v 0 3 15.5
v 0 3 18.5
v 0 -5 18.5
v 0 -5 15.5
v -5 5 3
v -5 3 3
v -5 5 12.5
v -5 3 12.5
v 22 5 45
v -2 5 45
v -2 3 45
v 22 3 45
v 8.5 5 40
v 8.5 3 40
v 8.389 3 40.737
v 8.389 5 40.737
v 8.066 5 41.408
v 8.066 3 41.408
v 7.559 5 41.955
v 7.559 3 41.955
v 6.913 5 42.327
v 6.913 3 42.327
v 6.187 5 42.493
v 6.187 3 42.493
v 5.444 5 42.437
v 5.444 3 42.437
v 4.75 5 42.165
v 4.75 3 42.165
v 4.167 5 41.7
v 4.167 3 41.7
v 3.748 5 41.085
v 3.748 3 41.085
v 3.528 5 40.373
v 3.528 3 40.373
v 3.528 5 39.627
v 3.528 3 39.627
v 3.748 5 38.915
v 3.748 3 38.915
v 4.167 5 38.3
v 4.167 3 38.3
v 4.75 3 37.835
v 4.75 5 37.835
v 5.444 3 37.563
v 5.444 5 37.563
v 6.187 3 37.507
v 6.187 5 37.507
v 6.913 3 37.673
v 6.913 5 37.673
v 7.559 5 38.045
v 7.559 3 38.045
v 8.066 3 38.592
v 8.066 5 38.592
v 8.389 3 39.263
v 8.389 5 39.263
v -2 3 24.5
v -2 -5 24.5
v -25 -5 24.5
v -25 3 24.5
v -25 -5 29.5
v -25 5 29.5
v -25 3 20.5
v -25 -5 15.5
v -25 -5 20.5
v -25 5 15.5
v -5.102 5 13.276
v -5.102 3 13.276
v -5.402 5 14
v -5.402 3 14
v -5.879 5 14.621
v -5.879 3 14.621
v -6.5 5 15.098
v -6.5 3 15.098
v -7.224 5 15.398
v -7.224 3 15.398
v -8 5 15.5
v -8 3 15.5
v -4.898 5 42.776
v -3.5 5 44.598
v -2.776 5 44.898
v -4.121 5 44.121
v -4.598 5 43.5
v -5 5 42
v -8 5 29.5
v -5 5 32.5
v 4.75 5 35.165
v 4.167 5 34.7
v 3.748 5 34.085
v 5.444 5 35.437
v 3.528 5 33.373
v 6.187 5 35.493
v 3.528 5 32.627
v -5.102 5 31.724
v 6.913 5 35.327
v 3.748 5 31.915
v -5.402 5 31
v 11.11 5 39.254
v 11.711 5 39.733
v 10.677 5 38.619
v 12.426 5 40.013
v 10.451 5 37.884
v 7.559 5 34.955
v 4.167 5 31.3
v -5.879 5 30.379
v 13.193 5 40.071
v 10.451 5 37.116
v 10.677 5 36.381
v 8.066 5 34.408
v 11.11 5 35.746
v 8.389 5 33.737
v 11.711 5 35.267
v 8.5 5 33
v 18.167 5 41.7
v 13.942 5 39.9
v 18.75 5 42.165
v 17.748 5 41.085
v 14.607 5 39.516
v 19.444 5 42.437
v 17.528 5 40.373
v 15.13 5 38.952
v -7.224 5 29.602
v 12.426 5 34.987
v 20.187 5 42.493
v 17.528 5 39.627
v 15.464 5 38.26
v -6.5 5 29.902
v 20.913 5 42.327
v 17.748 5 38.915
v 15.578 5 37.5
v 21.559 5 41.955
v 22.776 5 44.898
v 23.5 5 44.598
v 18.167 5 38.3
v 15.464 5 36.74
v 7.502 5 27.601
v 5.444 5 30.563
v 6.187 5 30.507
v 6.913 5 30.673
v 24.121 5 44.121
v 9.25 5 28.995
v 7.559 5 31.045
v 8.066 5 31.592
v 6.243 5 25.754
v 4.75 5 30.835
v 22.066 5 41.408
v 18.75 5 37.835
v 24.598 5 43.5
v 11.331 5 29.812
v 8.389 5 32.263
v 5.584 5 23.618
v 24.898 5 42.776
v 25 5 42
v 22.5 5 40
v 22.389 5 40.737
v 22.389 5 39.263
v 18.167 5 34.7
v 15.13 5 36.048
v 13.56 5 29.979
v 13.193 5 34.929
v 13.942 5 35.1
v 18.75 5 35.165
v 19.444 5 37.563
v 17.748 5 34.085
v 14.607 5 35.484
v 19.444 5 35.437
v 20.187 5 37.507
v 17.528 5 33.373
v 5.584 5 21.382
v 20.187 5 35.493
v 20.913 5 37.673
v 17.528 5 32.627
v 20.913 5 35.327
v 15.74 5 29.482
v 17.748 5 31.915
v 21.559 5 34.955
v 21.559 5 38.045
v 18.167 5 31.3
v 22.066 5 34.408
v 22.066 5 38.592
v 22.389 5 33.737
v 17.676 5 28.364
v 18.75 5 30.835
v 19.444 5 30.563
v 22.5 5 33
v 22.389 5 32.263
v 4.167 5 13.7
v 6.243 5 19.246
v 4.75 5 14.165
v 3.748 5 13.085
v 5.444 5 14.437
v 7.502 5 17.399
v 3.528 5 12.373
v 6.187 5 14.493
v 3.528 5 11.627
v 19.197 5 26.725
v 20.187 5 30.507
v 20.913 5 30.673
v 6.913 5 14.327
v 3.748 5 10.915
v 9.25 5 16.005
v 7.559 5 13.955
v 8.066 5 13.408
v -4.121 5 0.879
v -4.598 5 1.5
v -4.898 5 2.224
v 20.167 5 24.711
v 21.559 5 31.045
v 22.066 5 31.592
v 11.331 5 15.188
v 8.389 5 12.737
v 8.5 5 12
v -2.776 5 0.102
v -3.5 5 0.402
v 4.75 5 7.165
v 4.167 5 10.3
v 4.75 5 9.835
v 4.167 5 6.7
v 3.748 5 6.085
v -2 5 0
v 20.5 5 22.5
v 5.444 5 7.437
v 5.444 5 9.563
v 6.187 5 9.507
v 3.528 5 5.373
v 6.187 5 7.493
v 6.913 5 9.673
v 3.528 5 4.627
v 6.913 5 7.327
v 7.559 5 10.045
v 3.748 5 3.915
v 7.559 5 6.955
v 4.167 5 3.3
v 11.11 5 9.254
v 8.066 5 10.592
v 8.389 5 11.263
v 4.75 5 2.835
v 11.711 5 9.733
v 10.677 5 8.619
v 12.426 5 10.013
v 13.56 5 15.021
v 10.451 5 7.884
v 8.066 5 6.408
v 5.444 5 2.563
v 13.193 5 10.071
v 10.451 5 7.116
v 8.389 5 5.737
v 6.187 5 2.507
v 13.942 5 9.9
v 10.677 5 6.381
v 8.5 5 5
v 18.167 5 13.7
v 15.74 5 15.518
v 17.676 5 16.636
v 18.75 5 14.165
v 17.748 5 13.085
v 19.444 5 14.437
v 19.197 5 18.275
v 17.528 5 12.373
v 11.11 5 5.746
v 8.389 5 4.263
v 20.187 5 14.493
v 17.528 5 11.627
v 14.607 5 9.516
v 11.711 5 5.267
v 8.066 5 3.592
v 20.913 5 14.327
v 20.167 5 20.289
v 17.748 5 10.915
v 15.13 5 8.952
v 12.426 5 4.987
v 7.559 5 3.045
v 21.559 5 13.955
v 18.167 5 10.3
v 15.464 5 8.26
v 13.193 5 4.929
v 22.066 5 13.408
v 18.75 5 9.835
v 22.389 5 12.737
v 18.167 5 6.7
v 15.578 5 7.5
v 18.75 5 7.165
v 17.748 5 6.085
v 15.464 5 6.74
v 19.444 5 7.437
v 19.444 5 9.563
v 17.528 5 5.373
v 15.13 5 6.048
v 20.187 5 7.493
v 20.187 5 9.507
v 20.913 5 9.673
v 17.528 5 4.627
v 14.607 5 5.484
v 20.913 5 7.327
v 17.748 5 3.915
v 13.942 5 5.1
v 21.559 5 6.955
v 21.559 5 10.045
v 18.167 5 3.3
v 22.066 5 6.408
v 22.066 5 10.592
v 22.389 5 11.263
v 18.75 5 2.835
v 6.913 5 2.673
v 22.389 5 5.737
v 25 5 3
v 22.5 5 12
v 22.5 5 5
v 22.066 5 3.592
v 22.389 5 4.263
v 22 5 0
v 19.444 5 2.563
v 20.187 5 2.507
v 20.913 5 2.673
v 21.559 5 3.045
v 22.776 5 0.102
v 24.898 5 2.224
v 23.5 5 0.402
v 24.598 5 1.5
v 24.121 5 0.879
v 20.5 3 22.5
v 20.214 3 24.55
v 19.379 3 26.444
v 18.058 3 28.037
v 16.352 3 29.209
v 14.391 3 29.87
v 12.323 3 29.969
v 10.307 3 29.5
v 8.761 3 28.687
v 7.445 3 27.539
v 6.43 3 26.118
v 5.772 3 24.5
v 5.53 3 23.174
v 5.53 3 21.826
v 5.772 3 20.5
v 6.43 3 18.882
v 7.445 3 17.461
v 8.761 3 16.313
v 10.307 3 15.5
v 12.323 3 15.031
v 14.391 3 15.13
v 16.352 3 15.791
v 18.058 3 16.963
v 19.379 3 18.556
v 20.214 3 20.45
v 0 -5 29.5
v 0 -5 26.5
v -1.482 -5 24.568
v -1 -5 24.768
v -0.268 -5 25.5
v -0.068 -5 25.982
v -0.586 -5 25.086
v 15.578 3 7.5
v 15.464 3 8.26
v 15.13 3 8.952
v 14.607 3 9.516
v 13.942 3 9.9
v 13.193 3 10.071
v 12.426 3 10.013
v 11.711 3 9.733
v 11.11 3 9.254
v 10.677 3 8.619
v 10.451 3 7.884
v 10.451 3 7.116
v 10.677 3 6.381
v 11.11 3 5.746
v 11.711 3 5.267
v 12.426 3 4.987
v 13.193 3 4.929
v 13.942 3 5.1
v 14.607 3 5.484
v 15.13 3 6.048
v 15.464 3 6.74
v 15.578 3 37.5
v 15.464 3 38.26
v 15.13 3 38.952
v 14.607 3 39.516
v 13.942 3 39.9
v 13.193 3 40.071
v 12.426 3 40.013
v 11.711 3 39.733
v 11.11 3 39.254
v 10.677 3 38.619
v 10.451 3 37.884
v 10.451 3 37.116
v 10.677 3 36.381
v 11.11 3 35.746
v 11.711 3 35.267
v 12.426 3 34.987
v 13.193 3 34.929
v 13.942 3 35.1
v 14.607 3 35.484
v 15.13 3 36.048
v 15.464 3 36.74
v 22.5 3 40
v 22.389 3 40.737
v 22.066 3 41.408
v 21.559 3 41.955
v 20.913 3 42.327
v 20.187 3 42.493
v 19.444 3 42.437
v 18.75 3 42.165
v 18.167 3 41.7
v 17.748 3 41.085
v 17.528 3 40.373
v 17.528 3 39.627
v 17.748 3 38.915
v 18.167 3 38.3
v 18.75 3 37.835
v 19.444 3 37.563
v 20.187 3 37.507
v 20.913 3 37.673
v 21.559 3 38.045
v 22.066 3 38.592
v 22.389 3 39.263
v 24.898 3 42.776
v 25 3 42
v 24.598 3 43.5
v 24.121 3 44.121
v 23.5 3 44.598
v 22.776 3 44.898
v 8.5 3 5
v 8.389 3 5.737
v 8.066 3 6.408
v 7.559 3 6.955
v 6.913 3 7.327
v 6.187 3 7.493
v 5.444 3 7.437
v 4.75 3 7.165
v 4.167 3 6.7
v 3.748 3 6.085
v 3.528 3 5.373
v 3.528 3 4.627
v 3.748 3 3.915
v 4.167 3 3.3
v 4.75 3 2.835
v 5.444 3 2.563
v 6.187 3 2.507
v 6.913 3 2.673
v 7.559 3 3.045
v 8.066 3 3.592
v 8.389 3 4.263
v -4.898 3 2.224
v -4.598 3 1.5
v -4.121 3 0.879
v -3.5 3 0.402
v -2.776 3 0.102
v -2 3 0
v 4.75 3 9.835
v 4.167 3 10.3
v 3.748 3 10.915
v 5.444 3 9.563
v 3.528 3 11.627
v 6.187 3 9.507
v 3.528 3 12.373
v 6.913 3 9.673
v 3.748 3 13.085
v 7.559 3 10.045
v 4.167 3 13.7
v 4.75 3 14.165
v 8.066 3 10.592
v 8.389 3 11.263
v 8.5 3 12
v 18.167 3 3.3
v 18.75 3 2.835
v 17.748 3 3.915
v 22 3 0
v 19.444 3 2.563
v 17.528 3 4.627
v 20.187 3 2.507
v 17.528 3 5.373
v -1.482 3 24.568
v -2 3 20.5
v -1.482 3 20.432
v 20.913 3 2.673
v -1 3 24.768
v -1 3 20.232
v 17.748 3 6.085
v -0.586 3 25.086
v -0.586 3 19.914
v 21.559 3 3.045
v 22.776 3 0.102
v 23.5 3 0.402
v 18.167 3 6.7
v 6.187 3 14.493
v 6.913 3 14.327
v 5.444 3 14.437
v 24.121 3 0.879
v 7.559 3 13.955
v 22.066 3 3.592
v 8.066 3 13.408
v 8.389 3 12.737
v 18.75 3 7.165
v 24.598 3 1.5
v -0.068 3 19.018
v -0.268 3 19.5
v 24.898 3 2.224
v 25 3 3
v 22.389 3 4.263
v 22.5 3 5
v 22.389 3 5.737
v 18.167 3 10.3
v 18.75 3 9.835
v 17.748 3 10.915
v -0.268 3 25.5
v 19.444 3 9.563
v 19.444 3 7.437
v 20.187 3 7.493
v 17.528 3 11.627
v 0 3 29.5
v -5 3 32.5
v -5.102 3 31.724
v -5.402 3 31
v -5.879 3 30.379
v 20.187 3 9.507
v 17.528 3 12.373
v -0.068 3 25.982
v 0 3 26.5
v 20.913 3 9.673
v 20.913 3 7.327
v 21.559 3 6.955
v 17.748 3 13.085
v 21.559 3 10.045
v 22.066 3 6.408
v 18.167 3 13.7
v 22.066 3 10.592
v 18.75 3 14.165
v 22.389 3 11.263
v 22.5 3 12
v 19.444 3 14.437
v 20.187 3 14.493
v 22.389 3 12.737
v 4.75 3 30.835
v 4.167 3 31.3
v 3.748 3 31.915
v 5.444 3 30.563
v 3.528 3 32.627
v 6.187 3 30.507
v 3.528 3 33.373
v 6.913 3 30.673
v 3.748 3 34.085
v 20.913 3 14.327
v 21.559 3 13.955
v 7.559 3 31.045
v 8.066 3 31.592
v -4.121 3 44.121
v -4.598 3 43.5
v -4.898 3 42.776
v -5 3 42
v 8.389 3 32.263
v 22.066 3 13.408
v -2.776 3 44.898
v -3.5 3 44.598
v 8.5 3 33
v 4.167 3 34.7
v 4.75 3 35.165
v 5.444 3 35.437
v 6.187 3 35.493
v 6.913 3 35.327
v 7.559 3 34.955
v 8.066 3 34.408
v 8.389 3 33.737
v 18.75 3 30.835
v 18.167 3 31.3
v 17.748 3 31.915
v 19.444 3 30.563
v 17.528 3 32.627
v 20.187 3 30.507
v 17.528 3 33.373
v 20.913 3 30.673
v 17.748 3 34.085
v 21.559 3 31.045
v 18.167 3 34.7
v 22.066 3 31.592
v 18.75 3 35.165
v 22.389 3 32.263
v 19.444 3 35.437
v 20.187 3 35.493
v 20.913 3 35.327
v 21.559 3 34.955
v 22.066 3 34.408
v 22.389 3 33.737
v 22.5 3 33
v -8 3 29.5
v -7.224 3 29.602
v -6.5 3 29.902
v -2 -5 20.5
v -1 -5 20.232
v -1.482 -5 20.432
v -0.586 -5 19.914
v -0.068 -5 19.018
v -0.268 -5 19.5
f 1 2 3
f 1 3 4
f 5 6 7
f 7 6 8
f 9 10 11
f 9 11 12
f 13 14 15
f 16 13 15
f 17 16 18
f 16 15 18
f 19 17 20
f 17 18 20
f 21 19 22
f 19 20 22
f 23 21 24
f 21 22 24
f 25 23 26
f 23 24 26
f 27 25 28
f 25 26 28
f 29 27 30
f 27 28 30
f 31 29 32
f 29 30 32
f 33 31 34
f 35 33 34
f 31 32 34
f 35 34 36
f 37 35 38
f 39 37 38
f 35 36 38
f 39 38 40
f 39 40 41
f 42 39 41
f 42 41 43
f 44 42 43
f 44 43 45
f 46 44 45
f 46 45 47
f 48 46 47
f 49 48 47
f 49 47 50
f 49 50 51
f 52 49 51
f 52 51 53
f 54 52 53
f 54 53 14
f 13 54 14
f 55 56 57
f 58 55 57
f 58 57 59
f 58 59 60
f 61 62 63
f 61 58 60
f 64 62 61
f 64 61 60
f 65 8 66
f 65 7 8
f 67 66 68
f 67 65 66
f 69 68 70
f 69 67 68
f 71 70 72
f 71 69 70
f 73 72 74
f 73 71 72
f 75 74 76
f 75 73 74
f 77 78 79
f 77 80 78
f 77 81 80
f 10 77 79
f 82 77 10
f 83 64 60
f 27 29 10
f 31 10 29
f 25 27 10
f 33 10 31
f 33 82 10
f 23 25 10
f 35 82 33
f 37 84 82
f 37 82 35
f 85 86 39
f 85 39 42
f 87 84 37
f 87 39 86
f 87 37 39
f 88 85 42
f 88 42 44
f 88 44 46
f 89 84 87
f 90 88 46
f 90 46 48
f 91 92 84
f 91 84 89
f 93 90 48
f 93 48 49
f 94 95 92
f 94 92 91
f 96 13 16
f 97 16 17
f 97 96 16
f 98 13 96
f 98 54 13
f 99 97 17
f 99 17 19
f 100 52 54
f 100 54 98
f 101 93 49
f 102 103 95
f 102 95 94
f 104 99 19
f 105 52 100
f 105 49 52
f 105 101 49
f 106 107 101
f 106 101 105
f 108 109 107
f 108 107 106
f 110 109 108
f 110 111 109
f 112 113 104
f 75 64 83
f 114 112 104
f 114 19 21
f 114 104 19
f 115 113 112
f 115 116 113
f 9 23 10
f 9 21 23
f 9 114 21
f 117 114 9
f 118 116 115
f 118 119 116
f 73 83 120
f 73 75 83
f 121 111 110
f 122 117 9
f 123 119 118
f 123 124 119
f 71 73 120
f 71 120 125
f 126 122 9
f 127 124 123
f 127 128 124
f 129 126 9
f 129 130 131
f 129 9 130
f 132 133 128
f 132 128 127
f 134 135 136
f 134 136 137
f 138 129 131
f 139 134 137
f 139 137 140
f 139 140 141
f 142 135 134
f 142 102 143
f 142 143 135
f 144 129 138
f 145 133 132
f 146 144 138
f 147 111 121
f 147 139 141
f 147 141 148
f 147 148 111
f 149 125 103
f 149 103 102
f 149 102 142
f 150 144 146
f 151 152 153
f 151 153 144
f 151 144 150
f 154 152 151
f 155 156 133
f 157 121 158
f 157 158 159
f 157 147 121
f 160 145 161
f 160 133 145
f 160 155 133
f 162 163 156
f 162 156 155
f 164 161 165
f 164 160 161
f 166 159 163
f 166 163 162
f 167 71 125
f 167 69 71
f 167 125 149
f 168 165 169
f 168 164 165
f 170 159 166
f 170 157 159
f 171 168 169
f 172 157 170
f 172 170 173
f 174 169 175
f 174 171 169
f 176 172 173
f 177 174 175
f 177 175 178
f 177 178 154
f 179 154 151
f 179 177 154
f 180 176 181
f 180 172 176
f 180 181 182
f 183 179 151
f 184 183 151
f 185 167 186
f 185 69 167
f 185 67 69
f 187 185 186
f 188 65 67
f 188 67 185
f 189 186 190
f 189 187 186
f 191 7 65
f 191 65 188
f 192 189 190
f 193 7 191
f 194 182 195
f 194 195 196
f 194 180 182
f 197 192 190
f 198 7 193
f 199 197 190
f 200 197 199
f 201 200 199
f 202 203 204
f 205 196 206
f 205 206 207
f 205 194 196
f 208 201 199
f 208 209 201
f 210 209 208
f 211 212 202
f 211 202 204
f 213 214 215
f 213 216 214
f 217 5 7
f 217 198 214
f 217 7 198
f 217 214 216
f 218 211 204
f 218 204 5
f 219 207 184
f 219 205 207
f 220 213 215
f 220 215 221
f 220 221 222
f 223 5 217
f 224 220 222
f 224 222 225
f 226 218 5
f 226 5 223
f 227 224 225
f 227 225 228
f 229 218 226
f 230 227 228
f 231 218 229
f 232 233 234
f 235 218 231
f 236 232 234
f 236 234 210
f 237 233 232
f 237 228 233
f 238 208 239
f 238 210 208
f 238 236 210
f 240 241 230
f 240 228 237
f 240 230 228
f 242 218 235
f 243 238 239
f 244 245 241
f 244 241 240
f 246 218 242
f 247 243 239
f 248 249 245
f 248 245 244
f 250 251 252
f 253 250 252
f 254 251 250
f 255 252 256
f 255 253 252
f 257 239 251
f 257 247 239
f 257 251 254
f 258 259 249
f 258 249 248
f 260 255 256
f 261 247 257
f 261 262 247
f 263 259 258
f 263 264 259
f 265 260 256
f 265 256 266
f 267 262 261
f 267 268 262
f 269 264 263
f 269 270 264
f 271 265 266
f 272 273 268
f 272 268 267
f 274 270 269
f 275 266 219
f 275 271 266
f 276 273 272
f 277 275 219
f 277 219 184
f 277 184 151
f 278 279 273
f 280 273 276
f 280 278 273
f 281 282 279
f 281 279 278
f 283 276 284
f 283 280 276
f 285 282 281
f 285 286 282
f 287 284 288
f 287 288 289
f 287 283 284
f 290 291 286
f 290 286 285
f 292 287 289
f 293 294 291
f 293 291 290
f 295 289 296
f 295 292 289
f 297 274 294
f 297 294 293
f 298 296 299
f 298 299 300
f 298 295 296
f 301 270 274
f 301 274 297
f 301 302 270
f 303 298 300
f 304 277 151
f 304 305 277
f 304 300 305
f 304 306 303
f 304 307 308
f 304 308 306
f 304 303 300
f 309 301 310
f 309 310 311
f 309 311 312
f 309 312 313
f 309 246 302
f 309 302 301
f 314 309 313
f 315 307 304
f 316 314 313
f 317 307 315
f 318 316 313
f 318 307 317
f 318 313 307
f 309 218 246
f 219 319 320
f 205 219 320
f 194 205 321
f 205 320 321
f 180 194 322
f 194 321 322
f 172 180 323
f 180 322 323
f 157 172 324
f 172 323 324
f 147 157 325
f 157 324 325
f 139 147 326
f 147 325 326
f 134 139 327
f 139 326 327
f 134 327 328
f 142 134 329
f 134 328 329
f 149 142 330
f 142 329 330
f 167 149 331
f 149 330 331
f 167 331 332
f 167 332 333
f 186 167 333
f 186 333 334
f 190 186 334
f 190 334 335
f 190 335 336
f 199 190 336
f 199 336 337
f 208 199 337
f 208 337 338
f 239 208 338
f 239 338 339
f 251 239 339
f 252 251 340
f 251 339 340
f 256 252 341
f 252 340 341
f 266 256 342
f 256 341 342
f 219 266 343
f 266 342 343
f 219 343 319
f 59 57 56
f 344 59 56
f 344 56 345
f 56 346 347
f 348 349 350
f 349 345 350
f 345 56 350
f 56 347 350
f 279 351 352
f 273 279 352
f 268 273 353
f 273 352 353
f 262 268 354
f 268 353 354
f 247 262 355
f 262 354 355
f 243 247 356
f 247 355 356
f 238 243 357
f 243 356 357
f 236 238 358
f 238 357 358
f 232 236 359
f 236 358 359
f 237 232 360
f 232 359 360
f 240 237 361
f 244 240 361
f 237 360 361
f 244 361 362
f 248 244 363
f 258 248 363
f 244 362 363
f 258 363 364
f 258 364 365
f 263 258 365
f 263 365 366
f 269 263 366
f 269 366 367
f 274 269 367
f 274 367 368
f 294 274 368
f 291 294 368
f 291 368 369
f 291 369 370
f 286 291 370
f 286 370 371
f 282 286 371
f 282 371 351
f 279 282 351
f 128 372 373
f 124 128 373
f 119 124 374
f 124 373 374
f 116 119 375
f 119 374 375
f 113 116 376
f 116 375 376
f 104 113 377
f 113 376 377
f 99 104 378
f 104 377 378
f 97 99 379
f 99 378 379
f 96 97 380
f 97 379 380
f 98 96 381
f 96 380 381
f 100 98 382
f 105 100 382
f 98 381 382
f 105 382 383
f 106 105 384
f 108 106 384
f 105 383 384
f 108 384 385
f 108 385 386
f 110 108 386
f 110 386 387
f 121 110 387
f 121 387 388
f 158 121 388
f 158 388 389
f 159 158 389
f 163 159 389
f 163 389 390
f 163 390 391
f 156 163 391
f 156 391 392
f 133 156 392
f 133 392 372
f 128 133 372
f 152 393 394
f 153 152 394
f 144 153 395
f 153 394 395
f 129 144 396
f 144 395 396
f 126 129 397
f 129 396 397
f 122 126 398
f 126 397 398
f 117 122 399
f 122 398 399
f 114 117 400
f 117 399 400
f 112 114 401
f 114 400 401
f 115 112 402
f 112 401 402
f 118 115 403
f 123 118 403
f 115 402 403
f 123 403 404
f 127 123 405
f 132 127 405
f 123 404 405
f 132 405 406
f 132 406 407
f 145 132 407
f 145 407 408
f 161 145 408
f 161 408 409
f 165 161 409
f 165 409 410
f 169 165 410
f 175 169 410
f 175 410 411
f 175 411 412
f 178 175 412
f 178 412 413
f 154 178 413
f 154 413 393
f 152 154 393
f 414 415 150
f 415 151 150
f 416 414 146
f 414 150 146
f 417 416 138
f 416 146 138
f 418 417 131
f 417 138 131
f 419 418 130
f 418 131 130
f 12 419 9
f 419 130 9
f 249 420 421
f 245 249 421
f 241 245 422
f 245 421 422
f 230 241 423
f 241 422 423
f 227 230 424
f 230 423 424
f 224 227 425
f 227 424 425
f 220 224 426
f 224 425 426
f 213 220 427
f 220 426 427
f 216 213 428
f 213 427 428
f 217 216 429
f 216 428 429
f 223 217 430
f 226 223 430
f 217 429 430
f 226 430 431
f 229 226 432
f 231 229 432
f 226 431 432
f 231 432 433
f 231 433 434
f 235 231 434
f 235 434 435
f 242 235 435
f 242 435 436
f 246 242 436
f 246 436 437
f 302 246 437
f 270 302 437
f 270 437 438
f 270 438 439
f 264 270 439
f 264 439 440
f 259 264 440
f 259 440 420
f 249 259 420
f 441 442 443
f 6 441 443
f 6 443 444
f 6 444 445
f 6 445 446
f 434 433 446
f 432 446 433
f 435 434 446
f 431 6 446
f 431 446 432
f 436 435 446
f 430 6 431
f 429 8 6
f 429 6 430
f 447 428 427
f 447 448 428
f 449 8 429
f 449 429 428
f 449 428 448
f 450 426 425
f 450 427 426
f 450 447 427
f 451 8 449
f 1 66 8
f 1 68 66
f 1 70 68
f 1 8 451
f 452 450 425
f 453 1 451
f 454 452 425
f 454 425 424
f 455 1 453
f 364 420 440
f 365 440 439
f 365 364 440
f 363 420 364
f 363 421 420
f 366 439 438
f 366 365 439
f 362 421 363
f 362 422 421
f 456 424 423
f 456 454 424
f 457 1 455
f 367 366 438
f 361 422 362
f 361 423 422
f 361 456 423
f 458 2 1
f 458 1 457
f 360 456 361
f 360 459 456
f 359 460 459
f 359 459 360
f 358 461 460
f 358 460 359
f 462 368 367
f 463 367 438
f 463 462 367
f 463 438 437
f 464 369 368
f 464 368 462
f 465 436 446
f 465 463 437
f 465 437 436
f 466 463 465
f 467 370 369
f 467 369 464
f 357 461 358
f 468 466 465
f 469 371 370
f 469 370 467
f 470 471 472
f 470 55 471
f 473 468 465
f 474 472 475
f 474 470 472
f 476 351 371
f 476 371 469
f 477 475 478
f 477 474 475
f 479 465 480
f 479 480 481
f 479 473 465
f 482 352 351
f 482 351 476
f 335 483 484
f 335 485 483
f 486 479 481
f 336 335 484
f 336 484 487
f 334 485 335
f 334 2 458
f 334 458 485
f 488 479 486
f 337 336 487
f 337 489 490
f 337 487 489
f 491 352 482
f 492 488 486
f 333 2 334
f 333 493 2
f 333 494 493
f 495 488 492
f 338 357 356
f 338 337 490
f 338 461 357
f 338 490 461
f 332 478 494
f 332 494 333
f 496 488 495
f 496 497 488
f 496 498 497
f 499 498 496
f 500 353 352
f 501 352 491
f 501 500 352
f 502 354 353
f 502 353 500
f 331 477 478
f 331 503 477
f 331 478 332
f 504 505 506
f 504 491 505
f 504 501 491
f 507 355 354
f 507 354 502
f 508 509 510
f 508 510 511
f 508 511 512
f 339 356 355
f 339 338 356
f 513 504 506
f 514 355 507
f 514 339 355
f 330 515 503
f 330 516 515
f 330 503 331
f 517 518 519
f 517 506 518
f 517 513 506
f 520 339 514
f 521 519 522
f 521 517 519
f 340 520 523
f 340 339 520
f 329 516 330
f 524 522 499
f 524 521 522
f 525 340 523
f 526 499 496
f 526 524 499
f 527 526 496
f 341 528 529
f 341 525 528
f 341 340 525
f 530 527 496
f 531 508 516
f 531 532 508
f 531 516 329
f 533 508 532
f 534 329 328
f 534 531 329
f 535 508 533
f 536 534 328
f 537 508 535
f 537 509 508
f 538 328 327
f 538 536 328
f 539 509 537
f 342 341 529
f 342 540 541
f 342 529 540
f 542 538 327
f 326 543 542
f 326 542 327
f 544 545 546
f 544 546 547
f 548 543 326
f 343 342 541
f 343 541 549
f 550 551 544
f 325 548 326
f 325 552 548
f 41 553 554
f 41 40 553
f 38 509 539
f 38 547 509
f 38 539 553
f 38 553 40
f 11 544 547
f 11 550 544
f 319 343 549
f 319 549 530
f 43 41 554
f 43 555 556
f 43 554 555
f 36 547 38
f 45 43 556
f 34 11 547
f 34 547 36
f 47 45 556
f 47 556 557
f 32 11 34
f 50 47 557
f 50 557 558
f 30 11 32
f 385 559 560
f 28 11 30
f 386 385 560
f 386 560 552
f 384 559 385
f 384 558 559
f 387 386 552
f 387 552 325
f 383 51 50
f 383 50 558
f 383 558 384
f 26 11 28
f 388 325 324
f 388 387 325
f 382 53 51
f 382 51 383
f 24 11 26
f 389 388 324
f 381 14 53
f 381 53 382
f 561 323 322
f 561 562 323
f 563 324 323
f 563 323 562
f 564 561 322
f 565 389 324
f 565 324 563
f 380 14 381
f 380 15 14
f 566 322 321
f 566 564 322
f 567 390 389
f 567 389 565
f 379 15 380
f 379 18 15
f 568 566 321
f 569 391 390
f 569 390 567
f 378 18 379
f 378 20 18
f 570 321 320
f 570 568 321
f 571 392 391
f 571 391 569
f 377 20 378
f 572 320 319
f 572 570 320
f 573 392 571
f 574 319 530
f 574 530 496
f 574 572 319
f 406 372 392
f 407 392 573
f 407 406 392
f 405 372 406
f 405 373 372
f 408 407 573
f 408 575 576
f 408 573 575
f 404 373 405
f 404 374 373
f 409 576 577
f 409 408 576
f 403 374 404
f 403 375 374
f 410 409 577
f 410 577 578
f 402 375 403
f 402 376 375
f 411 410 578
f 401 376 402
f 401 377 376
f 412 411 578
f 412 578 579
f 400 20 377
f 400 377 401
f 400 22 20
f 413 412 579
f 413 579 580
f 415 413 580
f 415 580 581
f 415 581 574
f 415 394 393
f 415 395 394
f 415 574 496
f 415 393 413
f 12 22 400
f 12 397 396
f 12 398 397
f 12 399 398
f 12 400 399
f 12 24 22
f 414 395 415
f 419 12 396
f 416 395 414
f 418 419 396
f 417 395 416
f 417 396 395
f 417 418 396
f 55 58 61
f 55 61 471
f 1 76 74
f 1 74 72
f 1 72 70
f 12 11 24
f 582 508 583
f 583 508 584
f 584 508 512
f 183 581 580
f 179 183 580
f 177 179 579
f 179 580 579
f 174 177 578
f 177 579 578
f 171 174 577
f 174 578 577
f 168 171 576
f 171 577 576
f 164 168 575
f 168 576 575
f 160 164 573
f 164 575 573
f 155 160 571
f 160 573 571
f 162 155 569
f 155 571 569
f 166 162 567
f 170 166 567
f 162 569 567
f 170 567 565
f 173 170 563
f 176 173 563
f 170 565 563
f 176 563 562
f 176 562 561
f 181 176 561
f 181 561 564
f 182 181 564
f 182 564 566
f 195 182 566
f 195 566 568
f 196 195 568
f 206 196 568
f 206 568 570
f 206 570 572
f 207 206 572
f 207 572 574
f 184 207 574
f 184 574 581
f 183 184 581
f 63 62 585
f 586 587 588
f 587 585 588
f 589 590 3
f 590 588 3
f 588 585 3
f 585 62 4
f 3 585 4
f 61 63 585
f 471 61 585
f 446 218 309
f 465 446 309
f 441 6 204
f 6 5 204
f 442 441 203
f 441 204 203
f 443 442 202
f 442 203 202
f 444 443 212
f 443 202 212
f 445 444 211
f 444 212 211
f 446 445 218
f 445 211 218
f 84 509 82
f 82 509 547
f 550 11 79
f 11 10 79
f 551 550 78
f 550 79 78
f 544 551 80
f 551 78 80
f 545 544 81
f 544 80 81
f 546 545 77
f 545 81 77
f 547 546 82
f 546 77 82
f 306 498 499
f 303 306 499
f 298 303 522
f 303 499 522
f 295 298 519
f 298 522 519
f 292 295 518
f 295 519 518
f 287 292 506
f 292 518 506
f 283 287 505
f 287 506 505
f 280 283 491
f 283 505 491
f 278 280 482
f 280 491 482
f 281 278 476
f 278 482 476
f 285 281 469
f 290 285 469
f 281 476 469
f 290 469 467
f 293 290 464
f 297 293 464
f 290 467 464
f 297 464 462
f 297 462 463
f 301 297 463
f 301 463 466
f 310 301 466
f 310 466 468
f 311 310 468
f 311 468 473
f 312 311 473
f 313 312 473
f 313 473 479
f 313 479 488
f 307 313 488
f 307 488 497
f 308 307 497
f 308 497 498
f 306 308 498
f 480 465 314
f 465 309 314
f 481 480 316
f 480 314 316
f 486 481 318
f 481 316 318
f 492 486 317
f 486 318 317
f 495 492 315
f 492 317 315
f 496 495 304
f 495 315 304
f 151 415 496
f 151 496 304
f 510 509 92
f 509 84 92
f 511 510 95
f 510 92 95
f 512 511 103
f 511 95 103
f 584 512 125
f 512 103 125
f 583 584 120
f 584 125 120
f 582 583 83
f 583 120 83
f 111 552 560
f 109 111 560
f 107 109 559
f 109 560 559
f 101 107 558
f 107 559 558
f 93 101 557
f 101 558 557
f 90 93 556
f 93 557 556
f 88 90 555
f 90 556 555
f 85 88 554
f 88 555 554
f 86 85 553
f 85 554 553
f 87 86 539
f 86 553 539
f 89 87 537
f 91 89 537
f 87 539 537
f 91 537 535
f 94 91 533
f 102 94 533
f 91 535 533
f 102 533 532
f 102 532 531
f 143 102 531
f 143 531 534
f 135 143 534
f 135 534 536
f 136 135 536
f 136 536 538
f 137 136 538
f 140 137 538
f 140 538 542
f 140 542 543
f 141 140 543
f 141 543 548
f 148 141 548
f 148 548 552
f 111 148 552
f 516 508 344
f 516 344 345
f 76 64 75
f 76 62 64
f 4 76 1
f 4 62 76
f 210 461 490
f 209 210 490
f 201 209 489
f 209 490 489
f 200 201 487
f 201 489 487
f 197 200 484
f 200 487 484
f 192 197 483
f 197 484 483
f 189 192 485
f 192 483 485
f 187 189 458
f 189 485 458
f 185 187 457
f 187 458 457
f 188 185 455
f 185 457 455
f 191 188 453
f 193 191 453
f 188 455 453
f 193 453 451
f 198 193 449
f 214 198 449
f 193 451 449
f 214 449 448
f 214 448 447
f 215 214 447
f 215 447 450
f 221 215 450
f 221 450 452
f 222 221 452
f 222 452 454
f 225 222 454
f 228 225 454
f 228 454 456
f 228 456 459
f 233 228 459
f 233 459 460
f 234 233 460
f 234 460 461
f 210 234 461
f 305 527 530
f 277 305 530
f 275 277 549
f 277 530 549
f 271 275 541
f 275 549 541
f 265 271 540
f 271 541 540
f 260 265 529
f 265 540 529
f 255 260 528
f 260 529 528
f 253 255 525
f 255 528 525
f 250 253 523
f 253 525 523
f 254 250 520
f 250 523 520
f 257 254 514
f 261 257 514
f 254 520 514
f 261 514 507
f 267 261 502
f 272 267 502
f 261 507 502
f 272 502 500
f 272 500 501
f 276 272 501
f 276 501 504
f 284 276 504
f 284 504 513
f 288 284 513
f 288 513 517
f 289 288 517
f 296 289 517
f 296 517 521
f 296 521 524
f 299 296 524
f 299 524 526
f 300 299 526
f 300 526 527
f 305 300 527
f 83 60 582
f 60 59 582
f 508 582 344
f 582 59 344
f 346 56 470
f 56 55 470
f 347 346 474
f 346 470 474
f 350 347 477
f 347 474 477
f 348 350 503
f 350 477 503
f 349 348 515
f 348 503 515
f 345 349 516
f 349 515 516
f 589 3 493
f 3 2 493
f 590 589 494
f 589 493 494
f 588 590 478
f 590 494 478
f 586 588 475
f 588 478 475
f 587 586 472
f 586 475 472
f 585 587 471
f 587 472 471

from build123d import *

# Parameters (mm, degrees)
F0_W      = 50
F0_H      = 10
F1_DEPTH  = 45
F2_R      = 2.5781
F3_DEPTH  = 25
F4_R      = 7.5
F5_DEPTH  = 10.001
F6_R      = 2.5
F7_DEPTH  = 25
F8_W      = 20
F8_H      = 15.5
F9_DEPTH  = 25
F8_R      = 2.5
F8_R_2    = 2.5781
F8_W_2    = 25
F8_H_2    = 4
F10_DEPTH = 8
F11_R     = 3
F12_R     = 2


# Not quite as in the source:
# - a feature of the source that left no trace in its solid (it failed there, or was rolled back) is left out


with BuildPart() as f1:
    # F0 (on Top) → F1 (new body)
    with BuildSketch(Plane.XY):
        Rectangle(F0_W, F0_H)
    extrude(amount=F1_DEPTH)

    # F2 (on face) → F3 (cut)
    with BuildSketch(Plane.XZ.offset(5)):
        with Locations((13, 37.5)):
            Circle(F2_R)
        with Locations((13, 7.5)):
            Circle(F2_R)
    extrude(amount=-F3_DEPTH, mode=Mode.SUBTRACT)

    # F4 (on face) → F5 (cut, through all)
    with BuildSketch(Plane.XZ.offset(5)):
        with Locations((13, 22.5)):
            Circle(F4_R)
    extrude(amount=-F5_DEPTH, mode=Mode.SUBTRACT)

    # F6 (on face) → F7 (cut)
    with BuildSketch(Plane.XZ.offset(5)):
        with Locations((6, 5)):
            Circle(F6_R)
        with Locations((6, 40)):
            Circle(F6_R)
        with Locations((20, 5)):
            Circle(F6_R)
        with Locations((20, 40)):
            Circle(F6_R)
        with Locations((6, 12)):
            Circle(F6_R)
        with Locations((6, 33)):
            Circle(F6_R)
        with Locations((20, 12)):
            Circle(F6_R)
        with Locations((20, 33)):
            Circle(F6_R)
    extrude(amount=-F7_DEPTH, mode=Mode.SUBTRACT)

    # F8 (on face) → F9 (cut)
    with BuildSketch(Plane.XZ.offset(5)):
        with Locations((-15, 7.75)):
            Rectangle(F8_W, F8_H)
        with Locations((-15, 37.25)):
            Rectangle(F8_W, F8_H)
    extrude(amount=-F9_DEPTH, mode=Mode.SUBTRACT)

    # F8 (on face) → F10 (cut)
    with BuildSketch(Plane.XZ.offset(5)):
        with BuildLine():
            Line((-5, 29.5), (0, 29.5))
            Line((0, 29.5), (10.3074175964, 29.5))
            ThreePointArc((10.3074175964, 29.5), (17.2459175671, 28.6824092402), (20.5, 22.5))
            ThreePointArc((20.5, 22.5), (17.2459175671, 16.3175907598), (10.3074175964, 15.5))
            Line((10.3074175964, 15.5), (0, 15.5))
            Line((0, 15.5), (-5, 15.5))
            Line((-5, 15.5), (-5, 0))
            Line((-5, 0), (25, 0))
            Line((25, 0), (25, 45))
            Line((25, 45), (-5, 45))
            Line((-5, 45), (-5, 29.5))
        make_face()
        with Locations((6, 5)):
            Circle(F8_R, mode=Mode.SUBTRACT)
        with Locations((20, 5)):
            Circle(F8_R, mode=Mode.SUBTRACT)
        with Locations((13, 7.5)):
            Circle(F8_R_2, mode=Mode.SUBTRACT)
        with Locations((6, 12)):
            Circle(F8_R, mode=Mode.SUBTRACT)
        with Locations((20, 12)):
            Circle(F8_R, mode=Mode.SUBTRACT)
        with Locations((6, 33)):
            Circle(F8_R, mode=Mode.SUBTRACT)
        with Locations((20, 33)):
            Circle(F8_R, mode=Mode.SUBTRACT)
        with Locations((6, 40)):
            Circle(F8_R, mode=Mode.SUBTRACT)
        with Locations((13, 37.5)):
            Circle(F8_R_2, mode=Mode.SUBTRACT)
        with Locations((20, 40)):
            Circle(F8_R, mode=Mode.SUBTRACT)
        with Locations((-12.5, 22.5)):
            Rectangle(F8_W_2, F8_H_2)
        with BuildLine():
            Line((10.3074175964, 24.5), (5.7715838526, 24.5))
            ThreePointArc((5.7715838526, 24.5), (5.5, 22.5), (5.7715838526, 20.5))
            Line((5.7715838526, 20.5), (10.3074175964, 20.5))
            Line((10.3074175964, 20.5), (10.3074175964, 24.5))
        make_face()
        with BuildLine():
            Line((5.7715838526, 20.5), (0, 20.5))
            Line((0, 20.5), (0, 15.5))
            Line((0, 15.5), (10.3074175964, 15.5))
            ThreePointArc((10.3074175964, 15.5), (7.4451324892, 17.4608089004), (5.7715838526, 20.5))
        make_face()
        with BuildLine():
            Line((5.7715838526, 24.5), (0, 24.5))
            Line((0, 24.5), (0, 20.5))
            Line((0, 20.5), (5.7715838526, 20.5))
            ThreePointArc((5.7715838526, 20.5), (5.5, 22.5), (5.7715838526, 24.5))
        make_face()
        with BuildLine():
            Line((0, 29.5), (0, 24.5))
            Line((0, 24.5), (5.7715838526, 24.5))
            ThreePointArc((5.7715838526, 24.5), (7.4451324892, 27.5391910996), (10.3074175964, 29.5))
            Line((10.3074175964, 29.5), (0, 29.5))
        make_face()
    extrude(amount=-F10_DEPTH, mode=Mode.SUBTRACT)

    # F11
    f11_edges = [f1.edges().sort_by_distance(p)[0] for p in [
        (25, 4, 0),
        (25, 4, 45),
        (-5, 4, 45),
        (-5, 4, 29.5),
        (-5, 4, 0),
        (-5, 4, 15.5),
    ]]
    fillet(f11_edges, radius=F11_R)

    # F12
    f12_edges = [f1.edges().sort_by_distance(p)[0] for p in [
        (0, -1, 20.5),
        (0, -1, 24.5),
    ]]
    fillet(f12_edges, radius=F12_R)


solid = f1.part
